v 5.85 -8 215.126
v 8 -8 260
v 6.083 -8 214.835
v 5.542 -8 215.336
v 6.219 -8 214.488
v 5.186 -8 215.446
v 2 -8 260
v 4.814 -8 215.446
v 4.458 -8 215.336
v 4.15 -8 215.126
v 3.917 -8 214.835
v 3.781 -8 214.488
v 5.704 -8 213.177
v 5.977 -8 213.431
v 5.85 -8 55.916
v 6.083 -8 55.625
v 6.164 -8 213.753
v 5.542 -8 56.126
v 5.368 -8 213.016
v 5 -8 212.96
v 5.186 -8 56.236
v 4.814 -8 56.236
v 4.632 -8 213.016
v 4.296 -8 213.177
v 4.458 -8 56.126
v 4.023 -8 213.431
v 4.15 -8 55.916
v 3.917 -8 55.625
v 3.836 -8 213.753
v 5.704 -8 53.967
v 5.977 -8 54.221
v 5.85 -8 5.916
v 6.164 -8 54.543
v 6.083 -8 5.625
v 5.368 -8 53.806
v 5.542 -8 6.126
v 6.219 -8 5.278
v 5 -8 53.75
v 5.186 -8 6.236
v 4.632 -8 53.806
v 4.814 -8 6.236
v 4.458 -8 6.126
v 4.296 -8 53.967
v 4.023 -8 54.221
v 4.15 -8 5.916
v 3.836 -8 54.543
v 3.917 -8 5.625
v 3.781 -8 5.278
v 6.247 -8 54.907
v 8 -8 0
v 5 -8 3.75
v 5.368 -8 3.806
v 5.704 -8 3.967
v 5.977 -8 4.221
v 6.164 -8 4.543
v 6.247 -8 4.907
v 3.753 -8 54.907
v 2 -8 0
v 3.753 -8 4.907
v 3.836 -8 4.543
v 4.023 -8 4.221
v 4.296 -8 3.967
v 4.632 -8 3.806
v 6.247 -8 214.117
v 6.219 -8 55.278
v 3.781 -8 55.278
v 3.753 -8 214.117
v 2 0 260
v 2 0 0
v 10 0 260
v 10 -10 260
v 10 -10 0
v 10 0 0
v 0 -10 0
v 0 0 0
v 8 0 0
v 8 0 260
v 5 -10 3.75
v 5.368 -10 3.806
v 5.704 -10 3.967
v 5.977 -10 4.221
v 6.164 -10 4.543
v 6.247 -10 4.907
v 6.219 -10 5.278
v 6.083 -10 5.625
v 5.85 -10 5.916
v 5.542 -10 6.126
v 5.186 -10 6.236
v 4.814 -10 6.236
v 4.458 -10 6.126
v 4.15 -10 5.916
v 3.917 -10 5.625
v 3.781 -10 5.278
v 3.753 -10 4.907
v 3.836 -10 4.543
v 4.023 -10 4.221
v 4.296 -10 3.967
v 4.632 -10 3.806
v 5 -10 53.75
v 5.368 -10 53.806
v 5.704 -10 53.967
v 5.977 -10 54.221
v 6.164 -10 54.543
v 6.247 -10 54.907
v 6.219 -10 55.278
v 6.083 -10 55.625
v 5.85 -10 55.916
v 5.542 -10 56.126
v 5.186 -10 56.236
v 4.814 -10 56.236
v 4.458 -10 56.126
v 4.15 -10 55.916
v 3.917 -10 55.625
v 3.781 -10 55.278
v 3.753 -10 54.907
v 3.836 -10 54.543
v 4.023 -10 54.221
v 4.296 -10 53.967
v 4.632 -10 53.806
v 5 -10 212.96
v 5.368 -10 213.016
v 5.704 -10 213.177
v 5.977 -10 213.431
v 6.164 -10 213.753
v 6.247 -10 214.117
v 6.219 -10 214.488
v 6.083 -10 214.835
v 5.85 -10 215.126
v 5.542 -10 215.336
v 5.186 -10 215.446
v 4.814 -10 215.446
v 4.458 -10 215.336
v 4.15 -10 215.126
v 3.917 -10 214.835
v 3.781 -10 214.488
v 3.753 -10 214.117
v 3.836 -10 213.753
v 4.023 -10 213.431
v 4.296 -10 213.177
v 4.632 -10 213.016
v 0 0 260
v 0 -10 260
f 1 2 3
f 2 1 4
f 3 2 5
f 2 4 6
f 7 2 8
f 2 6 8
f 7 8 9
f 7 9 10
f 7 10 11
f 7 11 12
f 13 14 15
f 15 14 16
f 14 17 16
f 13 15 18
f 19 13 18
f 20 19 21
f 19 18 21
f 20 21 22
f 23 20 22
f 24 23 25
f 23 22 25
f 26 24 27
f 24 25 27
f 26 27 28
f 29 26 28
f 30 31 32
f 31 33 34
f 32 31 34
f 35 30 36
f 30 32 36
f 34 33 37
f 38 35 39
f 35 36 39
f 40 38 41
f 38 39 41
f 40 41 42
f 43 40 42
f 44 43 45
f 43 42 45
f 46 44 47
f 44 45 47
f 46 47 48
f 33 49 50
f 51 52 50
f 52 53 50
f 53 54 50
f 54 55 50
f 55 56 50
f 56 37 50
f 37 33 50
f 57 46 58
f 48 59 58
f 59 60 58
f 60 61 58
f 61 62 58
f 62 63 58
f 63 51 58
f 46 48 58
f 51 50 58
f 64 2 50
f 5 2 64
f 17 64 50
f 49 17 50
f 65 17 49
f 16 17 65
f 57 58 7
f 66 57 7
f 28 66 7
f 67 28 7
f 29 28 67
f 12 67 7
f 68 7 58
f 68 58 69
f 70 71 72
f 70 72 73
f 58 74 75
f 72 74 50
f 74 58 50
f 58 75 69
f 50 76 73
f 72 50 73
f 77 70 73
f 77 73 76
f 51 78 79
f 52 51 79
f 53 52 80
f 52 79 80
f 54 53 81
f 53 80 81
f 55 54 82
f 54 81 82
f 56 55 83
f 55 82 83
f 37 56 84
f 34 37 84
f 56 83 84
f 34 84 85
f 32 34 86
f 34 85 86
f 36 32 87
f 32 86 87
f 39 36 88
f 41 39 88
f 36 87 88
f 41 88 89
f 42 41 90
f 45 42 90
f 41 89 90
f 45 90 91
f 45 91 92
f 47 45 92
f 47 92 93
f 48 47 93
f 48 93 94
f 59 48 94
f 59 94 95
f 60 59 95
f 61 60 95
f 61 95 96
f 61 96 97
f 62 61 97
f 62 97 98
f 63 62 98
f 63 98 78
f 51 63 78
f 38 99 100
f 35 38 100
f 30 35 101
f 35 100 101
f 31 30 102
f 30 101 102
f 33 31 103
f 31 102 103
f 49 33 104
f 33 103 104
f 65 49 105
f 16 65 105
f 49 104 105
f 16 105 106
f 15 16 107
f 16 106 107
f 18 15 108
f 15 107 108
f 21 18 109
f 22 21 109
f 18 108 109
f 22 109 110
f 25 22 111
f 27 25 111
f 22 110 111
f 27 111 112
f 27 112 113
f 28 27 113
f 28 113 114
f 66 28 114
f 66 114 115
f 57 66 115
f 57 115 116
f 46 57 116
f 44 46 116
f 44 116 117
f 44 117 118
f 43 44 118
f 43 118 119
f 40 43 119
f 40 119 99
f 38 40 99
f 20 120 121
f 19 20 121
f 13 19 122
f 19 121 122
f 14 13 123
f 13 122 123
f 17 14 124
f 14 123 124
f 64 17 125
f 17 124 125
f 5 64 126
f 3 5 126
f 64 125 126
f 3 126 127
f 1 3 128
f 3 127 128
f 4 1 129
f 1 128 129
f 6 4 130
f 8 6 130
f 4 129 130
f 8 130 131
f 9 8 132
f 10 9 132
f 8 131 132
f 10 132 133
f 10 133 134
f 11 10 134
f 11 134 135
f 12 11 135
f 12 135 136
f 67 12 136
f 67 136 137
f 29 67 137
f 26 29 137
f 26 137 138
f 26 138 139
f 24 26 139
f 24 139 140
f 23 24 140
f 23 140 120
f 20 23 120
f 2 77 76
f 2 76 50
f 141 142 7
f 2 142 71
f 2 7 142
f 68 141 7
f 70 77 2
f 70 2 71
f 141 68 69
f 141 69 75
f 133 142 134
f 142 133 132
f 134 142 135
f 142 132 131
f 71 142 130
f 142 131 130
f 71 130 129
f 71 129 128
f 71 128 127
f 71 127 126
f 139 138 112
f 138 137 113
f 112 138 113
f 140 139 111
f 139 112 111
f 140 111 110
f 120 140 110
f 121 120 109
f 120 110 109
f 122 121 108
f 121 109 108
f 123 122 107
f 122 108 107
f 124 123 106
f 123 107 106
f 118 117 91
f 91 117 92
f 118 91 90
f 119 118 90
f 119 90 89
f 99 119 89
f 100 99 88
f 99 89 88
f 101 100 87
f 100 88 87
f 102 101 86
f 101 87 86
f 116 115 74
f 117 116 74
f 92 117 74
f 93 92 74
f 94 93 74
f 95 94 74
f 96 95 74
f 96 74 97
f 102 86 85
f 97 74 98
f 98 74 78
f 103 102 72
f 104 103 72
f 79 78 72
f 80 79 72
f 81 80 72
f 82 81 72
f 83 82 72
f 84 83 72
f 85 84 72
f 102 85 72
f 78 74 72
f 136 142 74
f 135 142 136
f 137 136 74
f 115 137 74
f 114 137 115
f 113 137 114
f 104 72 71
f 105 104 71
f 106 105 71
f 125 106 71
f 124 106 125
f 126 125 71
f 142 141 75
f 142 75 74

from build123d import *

# Parameters (mm, degrees)
BOSS_EXTRU_1_DEPTH      = 260
ESQUISSE2_R             = 1.25
ENL_V_MAT_EXTRU_1_DEPTH = 10
ESQUISSE3_R             = 1.25
ENL_V_MAT_EXTRU_2_DEPTH = 10


with BuildPart() as part:
    # Esquisse1 → Boss.-Extru.1 (new body)
    with BuildSketch(Plane.XY):
        Polygon((0, 0), (0, -10), (10, -10), (10, 0), (8, 0), (8, -8), (2, -8), (2, 0), align=None)
    extrude(amount=BOSS_EXTRU_1_DEPTH)

    # Esquisse2 → Enlèv. mat.-Extru.1 (cut)
    with BuildSketch(Plane.XZ.offset(10)):
        with Locations(Location((5, 214.21, 0), (0, 0, 270))):
            Circle(ESQUISSE2_R)
    extrude(amount=-ENL_V_MAT_EXTRU_1_DEPTH, mode=Mode.SUBTRACT)

    # Esquisse3 → Enlèv. mat.-Extru.2 (cut)
    with BuildSketch(Plane(origin=(0, -10, 0), x_dir=(-1, 0, 0), z_dir=(0, -1, 0))):
        with Locations(Location((-5, -5, 0), (0, 0, 90))):
            Circle(ESQUISSE3_R)
        with Locations(Location((-5, -55, 0), (0, 0, 90))):
            Circle(ESQUISSE3_R)
    extrude(amount=-ENL_V_MAT_EXTRU_2_DEPTH, mode=Mode.SUBTRACT)


solid = part.part
